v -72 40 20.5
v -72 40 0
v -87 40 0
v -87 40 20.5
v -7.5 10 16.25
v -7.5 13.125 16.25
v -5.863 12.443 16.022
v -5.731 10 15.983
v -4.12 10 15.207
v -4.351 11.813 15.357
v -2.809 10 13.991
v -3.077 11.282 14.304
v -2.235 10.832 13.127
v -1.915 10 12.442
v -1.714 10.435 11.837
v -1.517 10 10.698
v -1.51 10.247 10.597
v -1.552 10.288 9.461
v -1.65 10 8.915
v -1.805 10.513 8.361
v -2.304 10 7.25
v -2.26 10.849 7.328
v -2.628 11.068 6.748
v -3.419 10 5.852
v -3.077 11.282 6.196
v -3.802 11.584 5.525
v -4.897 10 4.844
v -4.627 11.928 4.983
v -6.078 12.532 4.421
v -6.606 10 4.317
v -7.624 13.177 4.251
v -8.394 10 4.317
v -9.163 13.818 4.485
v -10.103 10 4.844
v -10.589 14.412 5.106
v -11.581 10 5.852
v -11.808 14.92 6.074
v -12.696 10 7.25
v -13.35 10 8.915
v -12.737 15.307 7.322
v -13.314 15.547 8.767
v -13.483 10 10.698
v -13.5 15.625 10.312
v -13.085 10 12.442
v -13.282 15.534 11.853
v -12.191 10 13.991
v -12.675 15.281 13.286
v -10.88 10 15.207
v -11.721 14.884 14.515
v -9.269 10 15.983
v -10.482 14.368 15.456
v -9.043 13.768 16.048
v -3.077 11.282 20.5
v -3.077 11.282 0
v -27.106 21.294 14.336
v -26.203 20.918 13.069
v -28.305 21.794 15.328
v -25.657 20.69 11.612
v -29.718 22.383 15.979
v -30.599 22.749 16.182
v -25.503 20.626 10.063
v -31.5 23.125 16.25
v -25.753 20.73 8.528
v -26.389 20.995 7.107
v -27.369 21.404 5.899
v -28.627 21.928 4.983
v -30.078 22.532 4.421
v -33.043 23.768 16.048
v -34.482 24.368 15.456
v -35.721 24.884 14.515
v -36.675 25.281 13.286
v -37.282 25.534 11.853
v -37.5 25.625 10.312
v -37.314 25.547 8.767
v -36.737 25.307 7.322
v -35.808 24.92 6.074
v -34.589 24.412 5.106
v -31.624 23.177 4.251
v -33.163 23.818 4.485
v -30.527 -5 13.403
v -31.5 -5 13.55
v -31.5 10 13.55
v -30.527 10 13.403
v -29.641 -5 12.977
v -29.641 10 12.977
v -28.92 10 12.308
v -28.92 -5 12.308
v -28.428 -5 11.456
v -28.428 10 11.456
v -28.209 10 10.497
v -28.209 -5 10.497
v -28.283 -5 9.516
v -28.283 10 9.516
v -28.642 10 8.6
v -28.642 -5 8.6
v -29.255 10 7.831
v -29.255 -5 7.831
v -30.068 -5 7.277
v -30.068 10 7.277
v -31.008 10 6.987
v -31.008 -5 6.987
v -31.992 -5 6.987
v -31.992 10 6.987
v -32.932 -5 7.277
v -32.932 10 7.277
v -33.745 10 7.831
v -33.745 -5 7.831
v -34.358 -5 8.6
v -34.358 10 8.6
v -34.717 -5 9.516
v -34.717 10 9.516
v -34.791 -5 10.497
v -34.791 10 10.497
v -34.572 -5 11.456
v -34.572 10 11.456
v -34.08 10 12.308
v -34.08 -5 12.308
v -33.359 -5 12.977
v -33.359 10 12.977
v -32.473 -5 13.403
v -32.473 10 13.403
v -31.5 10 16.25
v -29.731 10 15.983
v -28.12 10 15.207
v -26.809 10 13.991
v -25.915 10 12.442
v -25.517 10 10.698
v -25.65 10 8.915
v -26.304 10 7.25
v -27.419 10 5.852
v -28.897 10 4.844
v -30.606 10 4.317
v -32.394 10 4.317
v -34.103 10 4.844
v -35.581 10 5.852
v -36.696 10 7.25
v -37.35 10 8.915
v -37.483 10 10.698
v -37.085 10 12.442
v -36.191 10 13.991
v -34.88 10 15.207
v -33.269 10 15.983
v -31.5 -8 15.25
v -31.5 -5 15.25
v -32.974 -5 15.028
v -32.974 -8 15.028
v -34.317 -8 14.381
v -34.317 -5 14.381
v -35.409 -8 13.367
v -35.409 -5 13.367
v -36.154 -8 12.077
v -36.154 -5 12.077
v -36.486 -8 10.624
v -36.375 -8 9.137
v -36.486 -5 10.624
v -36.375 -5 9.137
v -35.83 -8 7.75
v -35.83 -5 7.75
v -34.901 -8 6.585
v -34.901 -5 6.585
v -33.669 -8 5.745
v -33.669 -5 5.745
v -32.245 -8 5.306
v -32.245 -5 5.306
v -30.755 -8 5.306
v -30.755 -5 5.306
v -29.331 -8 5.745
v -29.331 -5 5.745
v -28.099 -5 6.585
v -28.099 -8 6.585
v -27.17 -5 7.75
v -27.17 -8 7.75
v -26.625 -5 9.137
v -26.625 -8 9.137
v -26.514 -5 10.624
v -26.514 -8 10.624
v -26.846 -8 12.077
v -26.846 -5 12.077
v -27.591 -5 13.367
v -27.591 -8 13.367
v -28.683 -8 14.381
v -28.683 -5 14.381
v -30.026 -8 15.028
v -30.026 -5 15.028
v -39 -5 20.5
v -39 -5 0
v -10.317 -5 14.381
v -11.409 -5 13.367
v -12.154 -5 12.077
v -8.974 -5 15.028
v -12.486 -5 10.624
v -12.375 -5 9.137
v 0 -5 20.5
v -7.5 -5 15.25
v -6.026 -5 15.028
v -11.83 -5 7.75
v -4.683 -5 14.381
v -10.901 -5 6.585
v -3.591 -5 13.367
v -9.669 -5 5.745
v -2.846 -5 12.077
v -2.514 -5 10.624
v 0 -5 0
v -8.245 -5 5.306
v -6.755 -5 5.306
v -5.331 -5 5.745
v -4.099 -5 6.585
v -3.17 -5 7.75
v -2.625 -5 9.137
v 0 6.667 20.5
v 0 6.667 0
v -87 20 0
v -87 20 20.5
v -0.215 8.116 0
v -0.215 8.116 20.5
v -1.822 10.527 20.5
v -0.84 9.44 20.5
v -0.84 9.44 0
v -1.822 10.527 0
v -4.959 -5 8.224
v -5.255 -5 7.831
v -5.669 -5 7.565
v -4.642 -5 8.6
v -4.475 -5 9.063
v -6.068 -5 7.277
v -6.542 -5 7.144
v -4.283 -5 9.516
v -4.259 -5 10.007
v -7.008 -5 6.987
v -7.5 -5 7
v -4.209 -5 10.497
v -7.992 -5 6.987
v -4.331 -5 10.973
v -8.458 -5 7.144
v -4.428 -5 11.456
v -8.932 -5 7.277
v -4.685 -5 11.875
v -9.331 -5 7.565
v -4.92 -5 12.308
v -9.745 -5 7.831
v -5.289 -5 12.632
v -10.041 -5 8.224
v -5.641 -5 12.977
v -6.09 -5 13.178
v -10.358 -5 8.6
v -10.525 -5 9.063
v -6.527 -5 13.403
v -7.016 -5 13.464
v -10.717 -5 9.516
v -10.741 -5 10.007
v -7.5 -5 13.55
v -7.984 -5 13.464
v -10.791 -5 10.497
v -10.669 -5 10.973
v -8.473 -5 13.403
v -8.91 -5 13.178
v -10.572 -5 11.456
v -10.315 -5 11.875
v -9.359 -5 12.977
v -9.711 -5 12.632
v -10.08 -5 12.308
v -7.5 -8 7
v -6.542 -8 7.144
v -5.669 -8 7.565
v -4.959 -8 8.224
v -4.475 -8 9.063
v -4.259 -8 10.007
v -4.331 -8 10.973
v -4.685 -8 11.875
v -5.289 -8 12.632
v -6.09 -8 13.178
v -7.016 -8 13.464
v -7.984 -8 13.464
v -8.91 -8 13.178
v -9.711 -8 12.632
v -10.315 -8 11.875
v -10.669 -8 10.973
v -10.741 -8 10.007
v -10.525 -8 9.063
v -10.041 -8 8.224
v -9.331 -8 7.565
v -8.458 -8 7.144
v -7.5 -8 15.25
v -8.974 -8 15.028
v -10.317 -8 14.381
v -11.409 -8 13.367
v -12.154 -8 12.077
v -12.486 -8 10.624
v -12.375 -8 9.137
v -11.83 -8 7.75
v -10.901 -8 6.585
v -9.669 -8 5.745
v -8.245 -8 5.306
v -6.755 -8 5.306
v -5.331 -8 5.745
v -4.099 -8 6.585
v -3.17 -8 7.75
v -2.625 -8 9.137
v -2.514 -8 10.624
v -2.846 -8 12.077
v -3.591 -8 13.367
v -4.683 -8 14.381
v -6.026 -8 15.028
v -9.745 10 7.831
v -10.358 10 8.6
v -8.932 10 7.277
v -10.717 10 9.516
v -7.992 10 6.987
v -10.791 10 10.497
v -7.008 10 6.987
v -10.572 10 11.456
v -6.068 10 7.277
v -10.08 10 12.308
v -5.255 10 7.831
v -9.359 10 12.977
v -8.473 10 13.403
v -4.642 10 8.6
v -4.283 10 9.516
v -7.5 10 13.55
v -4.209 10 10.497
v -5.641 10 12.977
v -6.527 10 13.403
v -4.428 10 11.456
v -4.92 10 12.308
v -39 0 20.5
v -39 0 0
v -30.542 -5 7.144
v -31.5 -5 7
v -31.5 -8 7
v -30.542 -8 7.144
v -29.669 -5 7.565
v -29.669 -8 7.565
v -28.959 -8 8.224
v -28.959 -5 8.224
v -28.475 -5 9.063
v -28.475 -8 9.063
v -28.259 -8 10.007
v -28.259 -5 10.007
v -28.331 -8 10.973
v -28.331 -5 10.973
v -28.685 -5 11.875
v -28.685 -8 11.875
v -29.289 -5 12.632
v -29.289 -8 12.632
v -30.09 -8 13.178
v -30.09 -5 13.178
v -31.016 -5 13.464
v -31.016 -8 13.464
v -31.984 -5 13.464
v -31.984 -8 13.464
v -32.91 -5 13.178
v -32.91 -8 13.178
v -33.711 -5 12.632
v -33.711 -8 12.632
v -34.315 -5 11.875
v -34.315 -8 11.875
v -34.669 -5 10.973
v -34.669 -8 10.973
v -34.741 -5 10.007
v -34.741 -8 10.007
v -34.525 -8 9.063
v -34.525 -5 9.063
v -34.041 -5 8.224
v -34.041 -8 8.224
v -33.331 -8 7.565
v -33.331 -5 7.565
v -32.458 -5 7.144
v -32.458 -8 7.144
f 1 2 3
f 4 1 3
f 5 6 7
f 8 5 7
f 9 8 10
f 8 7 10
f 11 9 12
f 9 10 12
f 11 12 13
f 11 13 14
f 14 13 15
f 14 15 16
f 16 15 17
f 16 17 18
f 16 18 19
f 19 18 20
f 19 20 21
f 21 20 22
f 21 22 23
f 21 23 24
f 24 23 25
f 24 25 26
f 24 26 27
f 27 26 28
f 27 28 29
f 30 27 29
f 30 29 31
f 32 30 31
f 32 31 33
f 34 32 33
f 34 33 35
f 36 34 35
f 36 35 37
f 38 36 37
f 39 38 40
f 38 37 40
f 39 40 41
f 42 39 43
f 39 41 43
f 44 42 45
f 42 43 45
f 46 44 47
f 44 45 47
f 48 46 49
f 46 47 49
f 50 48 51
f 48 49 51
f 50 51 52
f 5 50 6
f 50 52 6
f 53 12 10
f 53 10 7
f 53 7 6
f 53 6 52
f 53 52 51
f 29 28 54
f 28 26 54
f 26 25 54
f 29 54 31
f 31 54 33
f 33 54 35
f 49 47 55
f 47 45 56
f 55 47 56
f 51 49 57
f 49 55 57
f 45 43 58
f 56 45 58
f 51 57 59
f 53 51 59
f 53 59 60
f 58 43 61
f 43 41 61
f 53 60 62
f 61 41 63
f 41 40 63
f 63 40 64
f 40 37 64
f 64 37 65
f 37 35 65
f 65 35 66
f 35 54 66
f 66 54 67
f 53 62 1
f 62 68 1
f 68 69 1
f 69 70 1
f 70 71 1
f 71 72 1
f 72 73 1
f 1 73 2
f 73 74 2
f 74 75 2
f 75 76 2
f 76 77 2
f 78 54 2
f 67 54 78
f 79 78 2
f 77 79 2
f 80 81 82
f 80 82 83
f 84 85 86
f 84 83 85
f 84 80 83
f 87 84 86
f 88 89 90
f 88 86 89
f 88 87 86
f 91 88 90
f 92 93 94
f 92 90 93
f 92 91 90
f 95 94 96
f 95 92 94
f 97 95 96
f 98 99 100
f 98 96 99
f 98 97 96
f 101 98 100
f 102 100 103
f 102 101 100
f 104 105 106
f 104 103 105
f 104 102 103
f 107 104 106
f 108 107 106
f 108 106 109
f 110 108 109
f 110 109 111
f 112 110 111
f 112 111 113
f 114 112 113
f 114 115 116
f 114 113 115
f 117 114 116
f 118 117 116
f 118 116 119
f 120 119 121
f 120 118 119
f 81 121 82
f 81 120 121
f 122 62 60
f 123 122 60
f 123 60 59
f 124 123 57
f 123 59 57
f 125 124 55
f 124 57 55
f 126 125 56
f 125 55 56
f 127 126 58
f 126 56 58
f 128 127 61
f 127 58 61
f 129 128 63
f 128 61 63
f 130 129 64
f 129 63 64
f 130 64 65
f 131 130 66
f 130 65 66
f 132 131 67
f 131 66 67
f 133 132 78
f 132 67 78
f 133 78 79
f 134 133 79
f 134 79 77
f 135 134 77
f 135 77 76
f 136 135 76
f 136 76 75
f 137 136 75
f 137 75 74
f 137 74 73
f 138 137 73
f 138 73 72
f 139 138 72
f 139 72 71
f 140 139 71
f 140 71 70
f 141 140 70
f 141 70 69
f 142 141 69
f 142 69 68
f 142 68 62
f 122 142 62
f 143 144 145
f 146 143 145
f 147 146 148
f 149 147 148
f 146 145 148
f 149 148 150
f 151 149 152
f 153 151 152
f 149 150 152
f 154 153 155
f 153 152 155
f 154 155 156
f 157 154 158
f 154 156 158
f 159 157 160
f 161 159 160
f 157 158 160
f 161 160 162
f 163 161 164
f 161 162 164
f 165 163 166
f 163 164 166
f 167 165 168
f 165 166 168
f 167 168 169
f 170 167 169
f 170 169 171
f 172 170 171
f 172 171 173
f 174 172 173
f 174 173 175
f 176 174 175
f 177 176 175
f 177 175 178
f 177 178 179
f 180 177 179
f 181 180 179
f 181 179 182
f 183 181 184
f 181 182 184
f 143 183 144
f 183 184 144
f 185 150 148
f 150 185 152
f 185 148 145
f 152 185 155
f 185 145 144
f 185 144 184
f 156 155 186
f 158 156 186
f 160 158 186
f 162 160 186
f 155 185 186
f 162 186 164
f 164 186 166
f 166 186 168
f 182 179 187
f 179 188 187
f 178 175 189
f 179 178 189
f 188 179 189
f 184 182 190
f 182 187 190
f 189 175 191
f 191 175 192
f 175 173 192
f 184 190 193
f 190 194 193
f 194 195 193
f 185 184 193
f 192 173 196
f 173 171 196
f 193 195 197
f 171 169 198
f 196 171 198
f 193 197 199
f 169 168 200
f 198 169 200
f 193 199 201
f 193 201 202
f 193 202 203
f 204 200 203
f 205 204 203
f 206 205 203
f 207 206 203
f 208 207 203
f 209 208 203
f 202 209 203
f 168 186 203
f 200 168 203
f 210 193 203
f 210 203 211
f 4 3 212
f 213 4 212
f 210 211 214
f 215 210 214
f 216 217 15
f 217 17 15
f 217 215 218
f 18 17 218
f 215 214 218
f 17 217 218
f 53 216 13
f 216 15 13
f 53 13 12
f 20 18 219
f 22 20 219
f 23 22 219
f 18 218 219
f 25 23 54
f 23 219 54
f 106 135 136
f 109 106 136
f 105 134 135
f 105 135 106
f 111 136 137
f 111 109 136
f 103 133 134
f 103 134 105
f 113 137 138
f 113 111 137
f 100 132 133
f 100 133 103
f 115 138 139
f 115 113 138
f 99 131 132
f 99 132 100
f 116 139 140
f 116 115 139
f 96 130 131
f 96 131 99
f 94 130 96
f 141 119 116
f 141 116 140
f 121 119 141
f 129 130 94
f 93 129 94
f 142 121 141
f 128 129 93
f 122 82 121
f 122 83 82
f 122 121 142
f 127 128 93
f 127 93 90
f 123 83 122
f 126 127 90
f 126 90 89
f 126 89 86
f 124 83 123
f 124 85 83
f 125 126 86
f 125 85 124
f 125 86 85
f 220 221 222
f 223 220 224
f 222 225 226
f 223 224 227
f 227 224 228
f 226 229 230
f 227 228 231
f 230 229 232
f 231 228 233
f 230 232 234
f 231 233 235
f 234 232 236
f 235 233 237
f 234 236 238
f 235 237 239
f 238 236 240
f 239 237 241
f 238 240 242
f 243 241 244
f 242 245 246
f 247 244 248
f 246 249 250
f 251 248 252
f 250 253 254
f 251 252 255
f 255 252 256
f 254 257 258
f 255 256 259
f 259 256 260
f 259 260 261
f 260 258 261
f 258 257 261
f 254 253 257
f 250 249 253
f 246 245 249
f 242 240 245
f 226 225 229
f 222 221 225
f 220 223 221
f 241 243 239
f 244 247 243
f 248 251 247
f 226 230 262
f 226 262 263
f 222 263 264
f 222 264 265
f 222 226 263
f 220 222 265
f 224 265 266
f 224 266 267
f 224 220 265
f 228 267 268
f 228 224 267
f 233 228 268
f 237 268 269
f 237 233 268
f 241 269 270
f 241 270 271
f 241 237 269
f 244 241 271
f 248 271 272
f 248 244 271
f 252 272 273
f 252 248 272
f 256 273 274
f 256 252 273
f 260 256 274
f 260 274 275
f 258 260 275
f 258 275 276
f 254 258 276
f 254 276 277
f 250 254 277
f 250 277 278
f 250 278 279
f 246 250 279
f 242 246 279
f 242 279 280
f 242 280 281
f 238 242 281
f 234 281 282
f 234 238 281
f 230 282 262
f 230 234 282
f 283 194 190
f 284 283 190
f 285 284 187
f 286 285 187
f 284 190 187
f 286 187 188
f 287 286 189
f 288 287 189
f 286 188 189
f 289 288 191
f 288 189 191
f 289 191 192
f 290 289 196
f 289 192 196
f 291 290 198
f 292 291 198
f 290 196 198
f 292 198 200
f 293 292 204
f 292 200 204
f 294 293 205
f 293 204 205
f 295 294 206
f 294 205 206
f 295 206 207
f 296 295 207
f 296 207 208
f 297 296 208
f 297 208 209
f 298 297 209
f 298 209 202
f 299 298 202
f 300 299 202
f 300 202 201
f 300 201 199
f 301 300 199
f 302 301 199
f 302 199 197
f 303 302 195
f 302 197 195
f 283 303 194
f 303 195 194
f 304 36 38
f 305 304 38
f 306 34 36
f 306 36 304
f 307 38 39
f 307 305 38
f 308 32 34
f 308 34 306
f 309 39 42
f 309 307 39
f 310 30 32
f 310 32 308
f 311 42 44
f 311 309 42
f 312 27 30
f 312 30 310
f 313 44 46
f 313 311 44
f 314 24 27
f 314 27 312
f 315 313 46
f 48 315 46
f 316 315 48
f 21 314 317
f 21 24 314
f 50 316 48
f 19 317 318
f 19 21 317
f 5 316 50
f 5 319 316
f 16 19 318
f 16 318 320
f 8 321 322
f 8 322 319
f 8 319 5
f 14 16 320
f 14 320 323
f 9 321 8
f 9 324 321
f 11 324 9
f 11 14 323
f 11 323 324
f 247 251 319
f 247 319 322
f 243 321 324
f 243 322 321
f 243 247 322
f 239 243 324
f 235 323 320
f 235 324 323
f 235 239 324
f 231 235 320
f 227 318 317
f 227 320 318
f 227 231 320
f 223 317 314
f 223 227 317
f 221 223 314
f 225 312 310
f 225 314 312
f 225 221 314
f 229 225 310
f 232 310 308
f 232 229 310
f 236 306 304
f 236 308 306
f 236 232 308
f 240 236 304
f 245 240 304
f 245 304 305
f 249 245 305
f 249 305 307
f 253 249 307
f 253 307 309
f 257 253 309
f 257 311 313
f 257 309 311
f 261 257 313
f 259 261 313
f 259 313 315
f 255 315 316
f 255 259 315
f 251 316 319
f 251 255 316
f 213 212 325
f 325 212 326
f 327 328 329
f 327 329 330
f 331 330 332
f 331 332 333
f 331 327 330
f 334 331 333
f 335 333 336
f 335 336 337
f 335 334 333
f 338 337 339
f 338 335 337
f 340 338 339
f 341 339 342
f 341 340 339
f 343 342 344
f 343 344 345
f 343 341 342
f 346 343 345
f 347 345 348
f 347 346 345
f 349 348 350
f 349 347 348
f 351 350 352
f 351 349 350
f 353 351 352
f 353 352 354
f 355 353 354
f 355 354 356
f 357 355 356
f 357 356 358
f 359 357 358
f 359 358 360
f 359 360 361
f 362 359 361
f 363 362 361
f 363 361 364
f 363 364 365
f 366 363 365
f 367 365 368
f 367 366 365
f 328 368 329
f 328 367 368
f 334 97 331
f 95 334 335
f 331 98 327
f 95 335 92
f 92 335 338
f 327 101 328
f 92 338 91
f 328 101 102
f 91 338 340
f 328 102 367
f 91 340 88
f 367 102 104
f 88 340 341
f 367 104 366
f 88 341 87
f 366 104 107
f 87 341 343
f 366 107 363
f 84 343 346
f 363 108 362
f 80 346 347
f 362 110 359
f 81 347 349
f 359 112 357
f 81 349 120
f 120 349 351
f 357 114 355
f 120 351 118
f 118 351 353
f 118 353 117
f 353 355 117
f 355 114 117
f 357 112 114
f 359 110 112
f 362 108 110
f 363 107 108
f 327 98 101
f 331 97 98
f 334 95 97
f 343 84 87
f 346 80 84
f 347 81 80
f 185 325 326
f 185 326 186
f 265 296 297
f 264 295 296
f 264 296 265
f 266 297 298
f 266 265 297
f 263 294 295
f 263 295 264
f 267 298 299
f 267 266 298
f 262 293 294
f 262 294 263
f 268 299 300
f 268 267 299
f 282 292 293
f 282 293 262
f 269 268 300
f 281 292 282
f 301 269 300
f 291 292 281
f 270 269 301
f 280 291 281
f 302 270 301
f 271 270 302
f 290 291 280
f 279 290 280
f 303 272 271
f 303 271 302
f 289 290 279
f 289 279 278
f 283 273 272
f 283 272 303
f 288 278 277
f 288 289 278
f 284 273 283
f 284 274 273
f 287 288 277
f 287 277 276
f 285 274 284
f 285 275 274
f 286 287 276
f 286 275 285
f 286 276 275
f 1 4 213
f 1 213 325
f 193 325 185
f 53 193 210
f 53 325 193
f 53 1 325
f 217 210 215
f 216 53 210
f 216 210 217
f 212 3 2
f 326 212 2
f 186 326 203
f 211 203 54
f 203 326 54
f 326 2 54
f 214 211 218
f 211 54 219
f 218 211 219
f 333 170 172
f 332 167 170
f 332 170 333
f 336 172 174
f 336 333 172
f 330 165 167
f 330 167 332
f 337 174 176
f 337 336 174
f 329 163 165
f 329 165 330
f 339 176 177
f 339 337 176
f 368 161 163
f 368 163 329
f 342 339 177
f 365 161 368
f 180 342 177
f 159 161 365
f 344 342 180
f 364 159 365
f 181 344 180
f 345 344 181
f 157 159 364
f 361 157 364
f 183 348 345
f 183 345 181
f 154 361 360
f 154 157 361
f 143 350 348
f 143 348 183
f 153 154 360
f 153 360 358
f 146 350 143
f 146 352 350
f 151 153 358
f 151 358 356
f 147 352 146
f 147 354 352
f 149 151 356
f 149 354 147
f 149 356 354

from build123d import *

# Parameters (mm, degrees)
BOSS_EXTRUDE1_DEPTH     = 20.5
CUT_EXTRUDE1_DEPTH      = 98.924715981
CUT_EXTRUDE1_DEPTH_BACK = 10
SKETCH2_R               = 3.3
SKETCH3_R               = 6
CUT_EXTRUDE2_DEPTH      = 30
SKETCH4_R               = 5
SKETCH4_R_2             = 3.25
BOSS_EXTRUDE2_DEPTH     = 3


with BuildPart() as part:
    # Sketch1 → Boss-Extrude1 (new body)
    with BuildSketch(Plane.XY):
        with BuildLine():
            Line((0, 0), (0, 6.666666667))
            ThreePointArc((0, 6.666666667), (-0.839748528, 9.440167648), (-3.076923077, 11.282051282))
            Line((-3.076923077, 11.282051282), (-72, 40))
            Line((-72, 40), (-87, 40))
            Line((-87, 40), (-87, 20))
            Line((-87, 20), (-39, 0))
            Line((-39, 0), (-39, -5))
            Line((-39, -5), (0, -5))
            Line((0, -5), (0, 0))
        make_face()
    extrude(amount=BOSS_EXTRUDE1_DEPTH)

    # Sketch2 → Cut-Extrude1 (cut, two sides: drawn at the far end of the back side and taken through both)
    with BuildSketch(Plane(origin=(0, 0, 0), x_dir=(1, 0, 0), z_dir=(0, 1, 0)).offset(-CUT_EXTRUDE1_DEPTH_BACK)):
        with Locations(Location((-7.5, -10.25, 0), (0, 0, 270))):
            Circle(SKETCH2_R)
        with Locations(Location((-31.5, -10.25, 0), (0, 0, 270))):
            Circle(SKETCH2_R)
    extrude(amount=CUT_EXTRUDE1_DEPTH + CUT_EXTRUDE1_DEPTH_BACK, mode=Mode.SUBTRACT)

    # Sketch3 → Cut-Extrude2 (cut)
    with BuildSketch(Plane(origin=(0, 40, 0), x_dir=(1, 0, 0), z_dir=(0, 1, 0))):
        with Locations(Location((-7.5, -10.25, 0), (0, 0, 270))):
            Circle(SKETCH3_R)
        with Locations(Location((-31.5, -10.25, 0), (0, 0, 270))):
            Circle(SKETCH3_R)
    extrude(amount=-CUT_EXTRUDE2_DEPTH, mode=Mode.SUBTRACT)

    # Sketch4 → Boss-Extrude2 (add)
    # profile 1 of 2: a face of its own
    with BuildSketch(Plane.XZ.offset(5)):
        with Locations(Location((-31.5, 10.25, 0), (0, 0, 90))):
            Circle(SKETCH4_R)
        with Locations(Location((-31.5, 10.25, 0), (0, 0, 270))):
            Circle(SKETCH4_R_2, mode=Mode.SUBTRACT)
    # profile 2 of 2: a face of its own
    with BuildSketch(Plane.XZ.offset(5)):
        with Locations(Location((-7.5, 10.25, 0), (0, 0, 90))):
            Circle(SKETCH4_R)
        with Locations(Location((-7.5, 10.25, 0), (0, 0, 270))):
            Circle(SKETCH4_R_2, mode=Mode.SUBTRACT)
    extrude(amount=BOSS_EXTRUDE2_DEPTH)


solid = part.part
